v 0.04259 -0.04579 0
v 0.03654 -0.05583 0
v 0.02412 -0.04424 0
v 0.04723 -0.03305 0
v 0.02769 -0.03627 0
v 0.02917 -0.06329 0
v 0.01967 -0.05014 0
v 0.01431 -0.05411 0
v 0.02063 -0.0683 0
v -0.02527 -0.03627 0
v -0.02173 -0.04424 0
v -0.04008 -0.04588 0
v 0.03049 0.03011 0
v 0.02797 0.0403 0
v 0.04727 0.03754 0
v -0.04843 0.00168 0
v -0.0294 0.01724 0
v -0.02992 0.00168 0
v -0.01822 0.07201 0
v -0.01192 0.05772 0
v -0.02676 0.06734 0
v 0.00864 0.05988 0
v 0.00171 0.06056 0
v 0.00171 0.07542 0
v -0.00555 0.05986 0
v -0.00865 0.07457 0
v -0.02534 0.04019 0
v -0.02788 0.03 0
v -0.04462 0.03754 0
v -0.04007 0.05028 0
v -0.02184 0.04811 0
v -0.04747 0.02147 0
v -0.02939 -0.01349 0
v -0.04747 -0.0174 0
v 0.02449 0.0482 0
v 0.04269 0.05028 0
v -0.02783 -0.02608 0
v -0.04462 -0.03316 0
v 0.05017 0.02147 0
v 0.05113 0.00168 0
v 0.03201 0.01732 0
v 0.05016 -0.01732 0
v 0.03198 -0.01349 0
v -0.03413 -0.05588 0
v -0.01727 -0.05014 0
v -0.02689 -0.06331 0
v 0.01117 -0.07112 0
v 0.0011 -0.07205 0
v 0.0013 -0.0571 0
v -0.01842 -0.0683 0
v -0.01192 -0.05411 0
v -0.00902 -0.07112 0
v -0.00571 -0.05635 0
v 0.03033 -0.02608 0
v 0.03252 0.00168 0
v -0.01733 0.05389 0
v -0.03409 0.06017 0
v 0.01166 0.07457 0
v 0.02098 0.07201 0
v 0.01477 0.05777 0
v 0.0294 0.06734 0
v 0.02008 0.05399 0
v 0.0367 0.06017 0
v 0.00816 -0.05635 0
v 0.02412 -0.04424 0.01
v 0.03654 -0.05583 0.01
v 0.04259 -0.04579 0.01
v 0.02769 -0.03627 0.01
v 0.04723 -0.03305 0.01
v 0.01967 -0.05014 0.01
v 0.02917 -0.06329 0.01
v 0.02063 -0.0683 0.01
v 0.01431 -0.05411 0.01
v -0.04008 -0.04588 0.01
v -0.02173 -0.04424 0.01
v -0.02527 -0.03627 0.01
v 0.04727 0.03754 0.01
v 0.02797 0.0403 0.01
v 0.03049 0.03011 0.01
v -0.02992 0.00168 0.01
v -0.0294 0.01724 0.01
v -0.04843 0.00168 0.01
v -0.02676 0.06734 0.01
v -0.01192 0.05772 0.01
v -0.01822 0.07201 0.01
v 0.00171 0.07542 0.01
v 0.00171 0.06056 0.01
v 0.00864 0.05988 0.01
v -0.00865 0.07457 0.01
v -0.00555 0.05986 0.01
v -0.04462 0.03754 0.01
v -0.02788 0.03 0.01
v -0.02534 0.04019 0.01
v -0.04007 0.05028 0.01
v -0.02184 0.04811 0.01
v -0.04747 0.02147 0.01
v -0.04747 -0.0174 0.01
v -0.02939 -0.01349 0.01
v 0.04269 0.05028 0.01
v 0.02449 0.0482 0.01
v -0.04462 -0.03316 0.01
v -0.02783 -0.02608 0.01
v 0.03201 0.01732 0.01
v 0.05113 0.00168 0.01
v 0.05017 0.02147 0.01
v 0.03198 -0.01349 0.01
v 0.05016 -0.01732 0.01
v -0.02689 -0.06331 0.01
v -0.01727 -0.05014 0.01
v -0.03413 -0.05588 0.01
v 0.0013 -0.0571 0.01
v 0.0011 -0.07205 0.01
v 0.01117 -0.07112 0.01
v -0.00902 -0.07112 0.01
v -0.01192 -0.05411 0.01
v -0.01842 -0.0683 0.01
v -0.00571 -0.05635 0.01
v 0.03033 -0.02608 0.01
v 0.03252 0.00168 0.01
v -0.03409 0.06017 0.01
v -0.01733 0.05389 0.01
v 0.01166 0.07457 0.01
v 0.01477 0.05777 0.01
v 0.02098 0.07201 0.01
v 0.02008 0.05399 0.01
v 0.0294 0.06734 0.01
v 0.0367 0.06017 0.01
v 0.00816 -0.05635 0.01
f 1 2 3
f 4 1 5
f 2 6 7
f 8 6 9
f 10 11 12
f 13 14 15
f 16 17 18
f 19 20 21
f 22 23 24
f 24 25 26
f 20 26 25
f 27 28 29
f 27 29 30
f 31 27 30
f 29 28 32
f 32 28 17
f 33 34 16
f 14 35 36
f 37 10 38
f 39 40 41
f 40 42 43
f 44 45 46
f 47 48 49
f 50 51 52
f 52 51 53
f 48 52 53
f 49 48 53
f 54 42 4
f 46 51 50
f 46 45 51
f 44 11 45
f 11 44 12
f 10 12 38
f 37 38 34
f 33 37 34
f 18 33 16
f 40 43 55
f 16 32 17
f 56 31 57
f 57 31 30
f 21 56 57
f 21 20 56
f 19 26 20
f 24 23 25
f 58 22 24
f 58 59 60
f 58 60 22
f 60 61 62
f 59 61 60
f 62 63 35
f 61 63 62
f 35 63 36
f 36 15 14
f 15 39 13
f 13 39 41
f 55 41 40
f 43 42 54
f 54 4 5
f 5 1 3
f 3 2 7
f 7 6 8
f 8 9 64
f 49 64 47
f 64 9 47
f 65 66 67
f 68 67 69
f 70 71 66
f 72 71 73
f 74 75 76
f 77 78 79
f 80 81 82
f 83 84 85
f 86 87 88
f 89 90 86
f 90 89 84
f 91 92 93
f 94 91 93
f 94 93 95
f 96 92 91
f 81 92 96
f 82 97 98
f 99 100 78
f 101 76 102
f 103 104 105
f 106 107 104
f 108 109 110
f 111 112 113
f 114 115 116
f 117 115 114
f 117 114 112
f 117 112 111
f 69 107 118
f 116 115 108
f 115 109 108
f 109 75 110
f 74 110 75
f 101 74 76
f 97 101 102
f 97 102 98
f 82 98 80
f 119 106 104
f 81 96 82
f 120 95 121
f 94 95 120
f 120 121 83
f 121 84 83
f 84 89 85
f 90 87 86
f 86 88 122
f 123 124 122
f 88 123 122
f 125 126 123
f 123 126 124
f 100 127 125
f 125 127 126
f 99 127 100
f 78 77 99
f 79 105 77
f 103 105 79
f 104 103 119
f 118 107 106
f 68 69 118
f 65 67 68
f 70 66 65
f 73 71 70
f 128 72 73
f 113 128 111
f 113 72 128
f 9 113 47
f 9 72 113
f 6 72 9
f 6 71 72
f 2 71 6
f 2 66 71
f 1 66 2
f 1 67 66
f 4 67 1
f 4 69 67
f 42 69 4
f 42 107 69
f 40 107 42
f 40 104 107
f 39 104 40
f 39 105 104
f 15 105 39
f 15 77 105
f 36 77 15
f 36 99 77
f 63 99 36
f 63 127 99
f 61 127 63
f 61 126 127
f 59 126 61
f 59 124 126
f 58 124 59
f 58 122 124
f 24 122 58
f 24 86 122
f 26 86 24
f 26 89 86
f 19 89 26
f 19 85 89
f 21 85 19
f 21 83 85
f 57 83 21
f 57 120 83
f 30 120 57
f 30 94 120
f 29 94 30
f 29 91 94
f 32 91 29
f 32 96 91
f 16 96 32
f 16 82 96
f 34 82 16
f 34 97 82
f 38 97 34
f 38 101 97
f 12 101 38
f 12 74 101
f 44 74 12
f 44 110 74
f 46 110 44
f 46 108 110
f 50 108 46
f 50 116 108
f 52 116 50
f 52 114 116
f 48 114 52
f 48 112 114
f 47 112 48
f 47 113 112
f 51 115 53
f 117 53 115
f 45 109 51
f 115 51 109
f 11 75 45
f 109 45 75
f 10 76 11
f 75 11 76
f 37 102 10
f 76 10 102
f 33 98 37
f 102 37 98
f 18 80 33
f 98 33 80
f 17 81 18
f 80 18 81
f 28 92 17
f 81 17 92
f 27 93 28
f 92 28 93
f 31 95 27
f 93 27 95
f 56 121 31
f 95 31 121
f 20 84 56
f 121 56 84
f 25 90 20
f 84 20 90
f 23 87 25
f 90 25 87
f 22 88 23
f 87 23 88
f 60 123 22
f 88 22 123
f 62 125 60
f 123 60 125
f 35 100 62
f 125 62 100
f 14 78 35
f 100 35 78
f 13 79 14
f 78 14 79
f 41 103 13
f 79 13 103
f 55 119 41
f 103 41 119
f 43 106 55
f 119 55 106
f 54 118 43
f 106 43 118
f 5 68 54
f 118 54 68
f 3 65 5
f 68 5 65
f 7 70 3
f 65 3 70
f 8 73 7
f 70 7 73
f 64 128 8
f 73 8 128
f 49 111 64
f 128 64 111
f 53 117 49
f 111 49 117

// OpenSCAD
translate([0, 0, 0]) linear_extrude(0.01) text("0",size=0.15, halign="center", valign="center");
